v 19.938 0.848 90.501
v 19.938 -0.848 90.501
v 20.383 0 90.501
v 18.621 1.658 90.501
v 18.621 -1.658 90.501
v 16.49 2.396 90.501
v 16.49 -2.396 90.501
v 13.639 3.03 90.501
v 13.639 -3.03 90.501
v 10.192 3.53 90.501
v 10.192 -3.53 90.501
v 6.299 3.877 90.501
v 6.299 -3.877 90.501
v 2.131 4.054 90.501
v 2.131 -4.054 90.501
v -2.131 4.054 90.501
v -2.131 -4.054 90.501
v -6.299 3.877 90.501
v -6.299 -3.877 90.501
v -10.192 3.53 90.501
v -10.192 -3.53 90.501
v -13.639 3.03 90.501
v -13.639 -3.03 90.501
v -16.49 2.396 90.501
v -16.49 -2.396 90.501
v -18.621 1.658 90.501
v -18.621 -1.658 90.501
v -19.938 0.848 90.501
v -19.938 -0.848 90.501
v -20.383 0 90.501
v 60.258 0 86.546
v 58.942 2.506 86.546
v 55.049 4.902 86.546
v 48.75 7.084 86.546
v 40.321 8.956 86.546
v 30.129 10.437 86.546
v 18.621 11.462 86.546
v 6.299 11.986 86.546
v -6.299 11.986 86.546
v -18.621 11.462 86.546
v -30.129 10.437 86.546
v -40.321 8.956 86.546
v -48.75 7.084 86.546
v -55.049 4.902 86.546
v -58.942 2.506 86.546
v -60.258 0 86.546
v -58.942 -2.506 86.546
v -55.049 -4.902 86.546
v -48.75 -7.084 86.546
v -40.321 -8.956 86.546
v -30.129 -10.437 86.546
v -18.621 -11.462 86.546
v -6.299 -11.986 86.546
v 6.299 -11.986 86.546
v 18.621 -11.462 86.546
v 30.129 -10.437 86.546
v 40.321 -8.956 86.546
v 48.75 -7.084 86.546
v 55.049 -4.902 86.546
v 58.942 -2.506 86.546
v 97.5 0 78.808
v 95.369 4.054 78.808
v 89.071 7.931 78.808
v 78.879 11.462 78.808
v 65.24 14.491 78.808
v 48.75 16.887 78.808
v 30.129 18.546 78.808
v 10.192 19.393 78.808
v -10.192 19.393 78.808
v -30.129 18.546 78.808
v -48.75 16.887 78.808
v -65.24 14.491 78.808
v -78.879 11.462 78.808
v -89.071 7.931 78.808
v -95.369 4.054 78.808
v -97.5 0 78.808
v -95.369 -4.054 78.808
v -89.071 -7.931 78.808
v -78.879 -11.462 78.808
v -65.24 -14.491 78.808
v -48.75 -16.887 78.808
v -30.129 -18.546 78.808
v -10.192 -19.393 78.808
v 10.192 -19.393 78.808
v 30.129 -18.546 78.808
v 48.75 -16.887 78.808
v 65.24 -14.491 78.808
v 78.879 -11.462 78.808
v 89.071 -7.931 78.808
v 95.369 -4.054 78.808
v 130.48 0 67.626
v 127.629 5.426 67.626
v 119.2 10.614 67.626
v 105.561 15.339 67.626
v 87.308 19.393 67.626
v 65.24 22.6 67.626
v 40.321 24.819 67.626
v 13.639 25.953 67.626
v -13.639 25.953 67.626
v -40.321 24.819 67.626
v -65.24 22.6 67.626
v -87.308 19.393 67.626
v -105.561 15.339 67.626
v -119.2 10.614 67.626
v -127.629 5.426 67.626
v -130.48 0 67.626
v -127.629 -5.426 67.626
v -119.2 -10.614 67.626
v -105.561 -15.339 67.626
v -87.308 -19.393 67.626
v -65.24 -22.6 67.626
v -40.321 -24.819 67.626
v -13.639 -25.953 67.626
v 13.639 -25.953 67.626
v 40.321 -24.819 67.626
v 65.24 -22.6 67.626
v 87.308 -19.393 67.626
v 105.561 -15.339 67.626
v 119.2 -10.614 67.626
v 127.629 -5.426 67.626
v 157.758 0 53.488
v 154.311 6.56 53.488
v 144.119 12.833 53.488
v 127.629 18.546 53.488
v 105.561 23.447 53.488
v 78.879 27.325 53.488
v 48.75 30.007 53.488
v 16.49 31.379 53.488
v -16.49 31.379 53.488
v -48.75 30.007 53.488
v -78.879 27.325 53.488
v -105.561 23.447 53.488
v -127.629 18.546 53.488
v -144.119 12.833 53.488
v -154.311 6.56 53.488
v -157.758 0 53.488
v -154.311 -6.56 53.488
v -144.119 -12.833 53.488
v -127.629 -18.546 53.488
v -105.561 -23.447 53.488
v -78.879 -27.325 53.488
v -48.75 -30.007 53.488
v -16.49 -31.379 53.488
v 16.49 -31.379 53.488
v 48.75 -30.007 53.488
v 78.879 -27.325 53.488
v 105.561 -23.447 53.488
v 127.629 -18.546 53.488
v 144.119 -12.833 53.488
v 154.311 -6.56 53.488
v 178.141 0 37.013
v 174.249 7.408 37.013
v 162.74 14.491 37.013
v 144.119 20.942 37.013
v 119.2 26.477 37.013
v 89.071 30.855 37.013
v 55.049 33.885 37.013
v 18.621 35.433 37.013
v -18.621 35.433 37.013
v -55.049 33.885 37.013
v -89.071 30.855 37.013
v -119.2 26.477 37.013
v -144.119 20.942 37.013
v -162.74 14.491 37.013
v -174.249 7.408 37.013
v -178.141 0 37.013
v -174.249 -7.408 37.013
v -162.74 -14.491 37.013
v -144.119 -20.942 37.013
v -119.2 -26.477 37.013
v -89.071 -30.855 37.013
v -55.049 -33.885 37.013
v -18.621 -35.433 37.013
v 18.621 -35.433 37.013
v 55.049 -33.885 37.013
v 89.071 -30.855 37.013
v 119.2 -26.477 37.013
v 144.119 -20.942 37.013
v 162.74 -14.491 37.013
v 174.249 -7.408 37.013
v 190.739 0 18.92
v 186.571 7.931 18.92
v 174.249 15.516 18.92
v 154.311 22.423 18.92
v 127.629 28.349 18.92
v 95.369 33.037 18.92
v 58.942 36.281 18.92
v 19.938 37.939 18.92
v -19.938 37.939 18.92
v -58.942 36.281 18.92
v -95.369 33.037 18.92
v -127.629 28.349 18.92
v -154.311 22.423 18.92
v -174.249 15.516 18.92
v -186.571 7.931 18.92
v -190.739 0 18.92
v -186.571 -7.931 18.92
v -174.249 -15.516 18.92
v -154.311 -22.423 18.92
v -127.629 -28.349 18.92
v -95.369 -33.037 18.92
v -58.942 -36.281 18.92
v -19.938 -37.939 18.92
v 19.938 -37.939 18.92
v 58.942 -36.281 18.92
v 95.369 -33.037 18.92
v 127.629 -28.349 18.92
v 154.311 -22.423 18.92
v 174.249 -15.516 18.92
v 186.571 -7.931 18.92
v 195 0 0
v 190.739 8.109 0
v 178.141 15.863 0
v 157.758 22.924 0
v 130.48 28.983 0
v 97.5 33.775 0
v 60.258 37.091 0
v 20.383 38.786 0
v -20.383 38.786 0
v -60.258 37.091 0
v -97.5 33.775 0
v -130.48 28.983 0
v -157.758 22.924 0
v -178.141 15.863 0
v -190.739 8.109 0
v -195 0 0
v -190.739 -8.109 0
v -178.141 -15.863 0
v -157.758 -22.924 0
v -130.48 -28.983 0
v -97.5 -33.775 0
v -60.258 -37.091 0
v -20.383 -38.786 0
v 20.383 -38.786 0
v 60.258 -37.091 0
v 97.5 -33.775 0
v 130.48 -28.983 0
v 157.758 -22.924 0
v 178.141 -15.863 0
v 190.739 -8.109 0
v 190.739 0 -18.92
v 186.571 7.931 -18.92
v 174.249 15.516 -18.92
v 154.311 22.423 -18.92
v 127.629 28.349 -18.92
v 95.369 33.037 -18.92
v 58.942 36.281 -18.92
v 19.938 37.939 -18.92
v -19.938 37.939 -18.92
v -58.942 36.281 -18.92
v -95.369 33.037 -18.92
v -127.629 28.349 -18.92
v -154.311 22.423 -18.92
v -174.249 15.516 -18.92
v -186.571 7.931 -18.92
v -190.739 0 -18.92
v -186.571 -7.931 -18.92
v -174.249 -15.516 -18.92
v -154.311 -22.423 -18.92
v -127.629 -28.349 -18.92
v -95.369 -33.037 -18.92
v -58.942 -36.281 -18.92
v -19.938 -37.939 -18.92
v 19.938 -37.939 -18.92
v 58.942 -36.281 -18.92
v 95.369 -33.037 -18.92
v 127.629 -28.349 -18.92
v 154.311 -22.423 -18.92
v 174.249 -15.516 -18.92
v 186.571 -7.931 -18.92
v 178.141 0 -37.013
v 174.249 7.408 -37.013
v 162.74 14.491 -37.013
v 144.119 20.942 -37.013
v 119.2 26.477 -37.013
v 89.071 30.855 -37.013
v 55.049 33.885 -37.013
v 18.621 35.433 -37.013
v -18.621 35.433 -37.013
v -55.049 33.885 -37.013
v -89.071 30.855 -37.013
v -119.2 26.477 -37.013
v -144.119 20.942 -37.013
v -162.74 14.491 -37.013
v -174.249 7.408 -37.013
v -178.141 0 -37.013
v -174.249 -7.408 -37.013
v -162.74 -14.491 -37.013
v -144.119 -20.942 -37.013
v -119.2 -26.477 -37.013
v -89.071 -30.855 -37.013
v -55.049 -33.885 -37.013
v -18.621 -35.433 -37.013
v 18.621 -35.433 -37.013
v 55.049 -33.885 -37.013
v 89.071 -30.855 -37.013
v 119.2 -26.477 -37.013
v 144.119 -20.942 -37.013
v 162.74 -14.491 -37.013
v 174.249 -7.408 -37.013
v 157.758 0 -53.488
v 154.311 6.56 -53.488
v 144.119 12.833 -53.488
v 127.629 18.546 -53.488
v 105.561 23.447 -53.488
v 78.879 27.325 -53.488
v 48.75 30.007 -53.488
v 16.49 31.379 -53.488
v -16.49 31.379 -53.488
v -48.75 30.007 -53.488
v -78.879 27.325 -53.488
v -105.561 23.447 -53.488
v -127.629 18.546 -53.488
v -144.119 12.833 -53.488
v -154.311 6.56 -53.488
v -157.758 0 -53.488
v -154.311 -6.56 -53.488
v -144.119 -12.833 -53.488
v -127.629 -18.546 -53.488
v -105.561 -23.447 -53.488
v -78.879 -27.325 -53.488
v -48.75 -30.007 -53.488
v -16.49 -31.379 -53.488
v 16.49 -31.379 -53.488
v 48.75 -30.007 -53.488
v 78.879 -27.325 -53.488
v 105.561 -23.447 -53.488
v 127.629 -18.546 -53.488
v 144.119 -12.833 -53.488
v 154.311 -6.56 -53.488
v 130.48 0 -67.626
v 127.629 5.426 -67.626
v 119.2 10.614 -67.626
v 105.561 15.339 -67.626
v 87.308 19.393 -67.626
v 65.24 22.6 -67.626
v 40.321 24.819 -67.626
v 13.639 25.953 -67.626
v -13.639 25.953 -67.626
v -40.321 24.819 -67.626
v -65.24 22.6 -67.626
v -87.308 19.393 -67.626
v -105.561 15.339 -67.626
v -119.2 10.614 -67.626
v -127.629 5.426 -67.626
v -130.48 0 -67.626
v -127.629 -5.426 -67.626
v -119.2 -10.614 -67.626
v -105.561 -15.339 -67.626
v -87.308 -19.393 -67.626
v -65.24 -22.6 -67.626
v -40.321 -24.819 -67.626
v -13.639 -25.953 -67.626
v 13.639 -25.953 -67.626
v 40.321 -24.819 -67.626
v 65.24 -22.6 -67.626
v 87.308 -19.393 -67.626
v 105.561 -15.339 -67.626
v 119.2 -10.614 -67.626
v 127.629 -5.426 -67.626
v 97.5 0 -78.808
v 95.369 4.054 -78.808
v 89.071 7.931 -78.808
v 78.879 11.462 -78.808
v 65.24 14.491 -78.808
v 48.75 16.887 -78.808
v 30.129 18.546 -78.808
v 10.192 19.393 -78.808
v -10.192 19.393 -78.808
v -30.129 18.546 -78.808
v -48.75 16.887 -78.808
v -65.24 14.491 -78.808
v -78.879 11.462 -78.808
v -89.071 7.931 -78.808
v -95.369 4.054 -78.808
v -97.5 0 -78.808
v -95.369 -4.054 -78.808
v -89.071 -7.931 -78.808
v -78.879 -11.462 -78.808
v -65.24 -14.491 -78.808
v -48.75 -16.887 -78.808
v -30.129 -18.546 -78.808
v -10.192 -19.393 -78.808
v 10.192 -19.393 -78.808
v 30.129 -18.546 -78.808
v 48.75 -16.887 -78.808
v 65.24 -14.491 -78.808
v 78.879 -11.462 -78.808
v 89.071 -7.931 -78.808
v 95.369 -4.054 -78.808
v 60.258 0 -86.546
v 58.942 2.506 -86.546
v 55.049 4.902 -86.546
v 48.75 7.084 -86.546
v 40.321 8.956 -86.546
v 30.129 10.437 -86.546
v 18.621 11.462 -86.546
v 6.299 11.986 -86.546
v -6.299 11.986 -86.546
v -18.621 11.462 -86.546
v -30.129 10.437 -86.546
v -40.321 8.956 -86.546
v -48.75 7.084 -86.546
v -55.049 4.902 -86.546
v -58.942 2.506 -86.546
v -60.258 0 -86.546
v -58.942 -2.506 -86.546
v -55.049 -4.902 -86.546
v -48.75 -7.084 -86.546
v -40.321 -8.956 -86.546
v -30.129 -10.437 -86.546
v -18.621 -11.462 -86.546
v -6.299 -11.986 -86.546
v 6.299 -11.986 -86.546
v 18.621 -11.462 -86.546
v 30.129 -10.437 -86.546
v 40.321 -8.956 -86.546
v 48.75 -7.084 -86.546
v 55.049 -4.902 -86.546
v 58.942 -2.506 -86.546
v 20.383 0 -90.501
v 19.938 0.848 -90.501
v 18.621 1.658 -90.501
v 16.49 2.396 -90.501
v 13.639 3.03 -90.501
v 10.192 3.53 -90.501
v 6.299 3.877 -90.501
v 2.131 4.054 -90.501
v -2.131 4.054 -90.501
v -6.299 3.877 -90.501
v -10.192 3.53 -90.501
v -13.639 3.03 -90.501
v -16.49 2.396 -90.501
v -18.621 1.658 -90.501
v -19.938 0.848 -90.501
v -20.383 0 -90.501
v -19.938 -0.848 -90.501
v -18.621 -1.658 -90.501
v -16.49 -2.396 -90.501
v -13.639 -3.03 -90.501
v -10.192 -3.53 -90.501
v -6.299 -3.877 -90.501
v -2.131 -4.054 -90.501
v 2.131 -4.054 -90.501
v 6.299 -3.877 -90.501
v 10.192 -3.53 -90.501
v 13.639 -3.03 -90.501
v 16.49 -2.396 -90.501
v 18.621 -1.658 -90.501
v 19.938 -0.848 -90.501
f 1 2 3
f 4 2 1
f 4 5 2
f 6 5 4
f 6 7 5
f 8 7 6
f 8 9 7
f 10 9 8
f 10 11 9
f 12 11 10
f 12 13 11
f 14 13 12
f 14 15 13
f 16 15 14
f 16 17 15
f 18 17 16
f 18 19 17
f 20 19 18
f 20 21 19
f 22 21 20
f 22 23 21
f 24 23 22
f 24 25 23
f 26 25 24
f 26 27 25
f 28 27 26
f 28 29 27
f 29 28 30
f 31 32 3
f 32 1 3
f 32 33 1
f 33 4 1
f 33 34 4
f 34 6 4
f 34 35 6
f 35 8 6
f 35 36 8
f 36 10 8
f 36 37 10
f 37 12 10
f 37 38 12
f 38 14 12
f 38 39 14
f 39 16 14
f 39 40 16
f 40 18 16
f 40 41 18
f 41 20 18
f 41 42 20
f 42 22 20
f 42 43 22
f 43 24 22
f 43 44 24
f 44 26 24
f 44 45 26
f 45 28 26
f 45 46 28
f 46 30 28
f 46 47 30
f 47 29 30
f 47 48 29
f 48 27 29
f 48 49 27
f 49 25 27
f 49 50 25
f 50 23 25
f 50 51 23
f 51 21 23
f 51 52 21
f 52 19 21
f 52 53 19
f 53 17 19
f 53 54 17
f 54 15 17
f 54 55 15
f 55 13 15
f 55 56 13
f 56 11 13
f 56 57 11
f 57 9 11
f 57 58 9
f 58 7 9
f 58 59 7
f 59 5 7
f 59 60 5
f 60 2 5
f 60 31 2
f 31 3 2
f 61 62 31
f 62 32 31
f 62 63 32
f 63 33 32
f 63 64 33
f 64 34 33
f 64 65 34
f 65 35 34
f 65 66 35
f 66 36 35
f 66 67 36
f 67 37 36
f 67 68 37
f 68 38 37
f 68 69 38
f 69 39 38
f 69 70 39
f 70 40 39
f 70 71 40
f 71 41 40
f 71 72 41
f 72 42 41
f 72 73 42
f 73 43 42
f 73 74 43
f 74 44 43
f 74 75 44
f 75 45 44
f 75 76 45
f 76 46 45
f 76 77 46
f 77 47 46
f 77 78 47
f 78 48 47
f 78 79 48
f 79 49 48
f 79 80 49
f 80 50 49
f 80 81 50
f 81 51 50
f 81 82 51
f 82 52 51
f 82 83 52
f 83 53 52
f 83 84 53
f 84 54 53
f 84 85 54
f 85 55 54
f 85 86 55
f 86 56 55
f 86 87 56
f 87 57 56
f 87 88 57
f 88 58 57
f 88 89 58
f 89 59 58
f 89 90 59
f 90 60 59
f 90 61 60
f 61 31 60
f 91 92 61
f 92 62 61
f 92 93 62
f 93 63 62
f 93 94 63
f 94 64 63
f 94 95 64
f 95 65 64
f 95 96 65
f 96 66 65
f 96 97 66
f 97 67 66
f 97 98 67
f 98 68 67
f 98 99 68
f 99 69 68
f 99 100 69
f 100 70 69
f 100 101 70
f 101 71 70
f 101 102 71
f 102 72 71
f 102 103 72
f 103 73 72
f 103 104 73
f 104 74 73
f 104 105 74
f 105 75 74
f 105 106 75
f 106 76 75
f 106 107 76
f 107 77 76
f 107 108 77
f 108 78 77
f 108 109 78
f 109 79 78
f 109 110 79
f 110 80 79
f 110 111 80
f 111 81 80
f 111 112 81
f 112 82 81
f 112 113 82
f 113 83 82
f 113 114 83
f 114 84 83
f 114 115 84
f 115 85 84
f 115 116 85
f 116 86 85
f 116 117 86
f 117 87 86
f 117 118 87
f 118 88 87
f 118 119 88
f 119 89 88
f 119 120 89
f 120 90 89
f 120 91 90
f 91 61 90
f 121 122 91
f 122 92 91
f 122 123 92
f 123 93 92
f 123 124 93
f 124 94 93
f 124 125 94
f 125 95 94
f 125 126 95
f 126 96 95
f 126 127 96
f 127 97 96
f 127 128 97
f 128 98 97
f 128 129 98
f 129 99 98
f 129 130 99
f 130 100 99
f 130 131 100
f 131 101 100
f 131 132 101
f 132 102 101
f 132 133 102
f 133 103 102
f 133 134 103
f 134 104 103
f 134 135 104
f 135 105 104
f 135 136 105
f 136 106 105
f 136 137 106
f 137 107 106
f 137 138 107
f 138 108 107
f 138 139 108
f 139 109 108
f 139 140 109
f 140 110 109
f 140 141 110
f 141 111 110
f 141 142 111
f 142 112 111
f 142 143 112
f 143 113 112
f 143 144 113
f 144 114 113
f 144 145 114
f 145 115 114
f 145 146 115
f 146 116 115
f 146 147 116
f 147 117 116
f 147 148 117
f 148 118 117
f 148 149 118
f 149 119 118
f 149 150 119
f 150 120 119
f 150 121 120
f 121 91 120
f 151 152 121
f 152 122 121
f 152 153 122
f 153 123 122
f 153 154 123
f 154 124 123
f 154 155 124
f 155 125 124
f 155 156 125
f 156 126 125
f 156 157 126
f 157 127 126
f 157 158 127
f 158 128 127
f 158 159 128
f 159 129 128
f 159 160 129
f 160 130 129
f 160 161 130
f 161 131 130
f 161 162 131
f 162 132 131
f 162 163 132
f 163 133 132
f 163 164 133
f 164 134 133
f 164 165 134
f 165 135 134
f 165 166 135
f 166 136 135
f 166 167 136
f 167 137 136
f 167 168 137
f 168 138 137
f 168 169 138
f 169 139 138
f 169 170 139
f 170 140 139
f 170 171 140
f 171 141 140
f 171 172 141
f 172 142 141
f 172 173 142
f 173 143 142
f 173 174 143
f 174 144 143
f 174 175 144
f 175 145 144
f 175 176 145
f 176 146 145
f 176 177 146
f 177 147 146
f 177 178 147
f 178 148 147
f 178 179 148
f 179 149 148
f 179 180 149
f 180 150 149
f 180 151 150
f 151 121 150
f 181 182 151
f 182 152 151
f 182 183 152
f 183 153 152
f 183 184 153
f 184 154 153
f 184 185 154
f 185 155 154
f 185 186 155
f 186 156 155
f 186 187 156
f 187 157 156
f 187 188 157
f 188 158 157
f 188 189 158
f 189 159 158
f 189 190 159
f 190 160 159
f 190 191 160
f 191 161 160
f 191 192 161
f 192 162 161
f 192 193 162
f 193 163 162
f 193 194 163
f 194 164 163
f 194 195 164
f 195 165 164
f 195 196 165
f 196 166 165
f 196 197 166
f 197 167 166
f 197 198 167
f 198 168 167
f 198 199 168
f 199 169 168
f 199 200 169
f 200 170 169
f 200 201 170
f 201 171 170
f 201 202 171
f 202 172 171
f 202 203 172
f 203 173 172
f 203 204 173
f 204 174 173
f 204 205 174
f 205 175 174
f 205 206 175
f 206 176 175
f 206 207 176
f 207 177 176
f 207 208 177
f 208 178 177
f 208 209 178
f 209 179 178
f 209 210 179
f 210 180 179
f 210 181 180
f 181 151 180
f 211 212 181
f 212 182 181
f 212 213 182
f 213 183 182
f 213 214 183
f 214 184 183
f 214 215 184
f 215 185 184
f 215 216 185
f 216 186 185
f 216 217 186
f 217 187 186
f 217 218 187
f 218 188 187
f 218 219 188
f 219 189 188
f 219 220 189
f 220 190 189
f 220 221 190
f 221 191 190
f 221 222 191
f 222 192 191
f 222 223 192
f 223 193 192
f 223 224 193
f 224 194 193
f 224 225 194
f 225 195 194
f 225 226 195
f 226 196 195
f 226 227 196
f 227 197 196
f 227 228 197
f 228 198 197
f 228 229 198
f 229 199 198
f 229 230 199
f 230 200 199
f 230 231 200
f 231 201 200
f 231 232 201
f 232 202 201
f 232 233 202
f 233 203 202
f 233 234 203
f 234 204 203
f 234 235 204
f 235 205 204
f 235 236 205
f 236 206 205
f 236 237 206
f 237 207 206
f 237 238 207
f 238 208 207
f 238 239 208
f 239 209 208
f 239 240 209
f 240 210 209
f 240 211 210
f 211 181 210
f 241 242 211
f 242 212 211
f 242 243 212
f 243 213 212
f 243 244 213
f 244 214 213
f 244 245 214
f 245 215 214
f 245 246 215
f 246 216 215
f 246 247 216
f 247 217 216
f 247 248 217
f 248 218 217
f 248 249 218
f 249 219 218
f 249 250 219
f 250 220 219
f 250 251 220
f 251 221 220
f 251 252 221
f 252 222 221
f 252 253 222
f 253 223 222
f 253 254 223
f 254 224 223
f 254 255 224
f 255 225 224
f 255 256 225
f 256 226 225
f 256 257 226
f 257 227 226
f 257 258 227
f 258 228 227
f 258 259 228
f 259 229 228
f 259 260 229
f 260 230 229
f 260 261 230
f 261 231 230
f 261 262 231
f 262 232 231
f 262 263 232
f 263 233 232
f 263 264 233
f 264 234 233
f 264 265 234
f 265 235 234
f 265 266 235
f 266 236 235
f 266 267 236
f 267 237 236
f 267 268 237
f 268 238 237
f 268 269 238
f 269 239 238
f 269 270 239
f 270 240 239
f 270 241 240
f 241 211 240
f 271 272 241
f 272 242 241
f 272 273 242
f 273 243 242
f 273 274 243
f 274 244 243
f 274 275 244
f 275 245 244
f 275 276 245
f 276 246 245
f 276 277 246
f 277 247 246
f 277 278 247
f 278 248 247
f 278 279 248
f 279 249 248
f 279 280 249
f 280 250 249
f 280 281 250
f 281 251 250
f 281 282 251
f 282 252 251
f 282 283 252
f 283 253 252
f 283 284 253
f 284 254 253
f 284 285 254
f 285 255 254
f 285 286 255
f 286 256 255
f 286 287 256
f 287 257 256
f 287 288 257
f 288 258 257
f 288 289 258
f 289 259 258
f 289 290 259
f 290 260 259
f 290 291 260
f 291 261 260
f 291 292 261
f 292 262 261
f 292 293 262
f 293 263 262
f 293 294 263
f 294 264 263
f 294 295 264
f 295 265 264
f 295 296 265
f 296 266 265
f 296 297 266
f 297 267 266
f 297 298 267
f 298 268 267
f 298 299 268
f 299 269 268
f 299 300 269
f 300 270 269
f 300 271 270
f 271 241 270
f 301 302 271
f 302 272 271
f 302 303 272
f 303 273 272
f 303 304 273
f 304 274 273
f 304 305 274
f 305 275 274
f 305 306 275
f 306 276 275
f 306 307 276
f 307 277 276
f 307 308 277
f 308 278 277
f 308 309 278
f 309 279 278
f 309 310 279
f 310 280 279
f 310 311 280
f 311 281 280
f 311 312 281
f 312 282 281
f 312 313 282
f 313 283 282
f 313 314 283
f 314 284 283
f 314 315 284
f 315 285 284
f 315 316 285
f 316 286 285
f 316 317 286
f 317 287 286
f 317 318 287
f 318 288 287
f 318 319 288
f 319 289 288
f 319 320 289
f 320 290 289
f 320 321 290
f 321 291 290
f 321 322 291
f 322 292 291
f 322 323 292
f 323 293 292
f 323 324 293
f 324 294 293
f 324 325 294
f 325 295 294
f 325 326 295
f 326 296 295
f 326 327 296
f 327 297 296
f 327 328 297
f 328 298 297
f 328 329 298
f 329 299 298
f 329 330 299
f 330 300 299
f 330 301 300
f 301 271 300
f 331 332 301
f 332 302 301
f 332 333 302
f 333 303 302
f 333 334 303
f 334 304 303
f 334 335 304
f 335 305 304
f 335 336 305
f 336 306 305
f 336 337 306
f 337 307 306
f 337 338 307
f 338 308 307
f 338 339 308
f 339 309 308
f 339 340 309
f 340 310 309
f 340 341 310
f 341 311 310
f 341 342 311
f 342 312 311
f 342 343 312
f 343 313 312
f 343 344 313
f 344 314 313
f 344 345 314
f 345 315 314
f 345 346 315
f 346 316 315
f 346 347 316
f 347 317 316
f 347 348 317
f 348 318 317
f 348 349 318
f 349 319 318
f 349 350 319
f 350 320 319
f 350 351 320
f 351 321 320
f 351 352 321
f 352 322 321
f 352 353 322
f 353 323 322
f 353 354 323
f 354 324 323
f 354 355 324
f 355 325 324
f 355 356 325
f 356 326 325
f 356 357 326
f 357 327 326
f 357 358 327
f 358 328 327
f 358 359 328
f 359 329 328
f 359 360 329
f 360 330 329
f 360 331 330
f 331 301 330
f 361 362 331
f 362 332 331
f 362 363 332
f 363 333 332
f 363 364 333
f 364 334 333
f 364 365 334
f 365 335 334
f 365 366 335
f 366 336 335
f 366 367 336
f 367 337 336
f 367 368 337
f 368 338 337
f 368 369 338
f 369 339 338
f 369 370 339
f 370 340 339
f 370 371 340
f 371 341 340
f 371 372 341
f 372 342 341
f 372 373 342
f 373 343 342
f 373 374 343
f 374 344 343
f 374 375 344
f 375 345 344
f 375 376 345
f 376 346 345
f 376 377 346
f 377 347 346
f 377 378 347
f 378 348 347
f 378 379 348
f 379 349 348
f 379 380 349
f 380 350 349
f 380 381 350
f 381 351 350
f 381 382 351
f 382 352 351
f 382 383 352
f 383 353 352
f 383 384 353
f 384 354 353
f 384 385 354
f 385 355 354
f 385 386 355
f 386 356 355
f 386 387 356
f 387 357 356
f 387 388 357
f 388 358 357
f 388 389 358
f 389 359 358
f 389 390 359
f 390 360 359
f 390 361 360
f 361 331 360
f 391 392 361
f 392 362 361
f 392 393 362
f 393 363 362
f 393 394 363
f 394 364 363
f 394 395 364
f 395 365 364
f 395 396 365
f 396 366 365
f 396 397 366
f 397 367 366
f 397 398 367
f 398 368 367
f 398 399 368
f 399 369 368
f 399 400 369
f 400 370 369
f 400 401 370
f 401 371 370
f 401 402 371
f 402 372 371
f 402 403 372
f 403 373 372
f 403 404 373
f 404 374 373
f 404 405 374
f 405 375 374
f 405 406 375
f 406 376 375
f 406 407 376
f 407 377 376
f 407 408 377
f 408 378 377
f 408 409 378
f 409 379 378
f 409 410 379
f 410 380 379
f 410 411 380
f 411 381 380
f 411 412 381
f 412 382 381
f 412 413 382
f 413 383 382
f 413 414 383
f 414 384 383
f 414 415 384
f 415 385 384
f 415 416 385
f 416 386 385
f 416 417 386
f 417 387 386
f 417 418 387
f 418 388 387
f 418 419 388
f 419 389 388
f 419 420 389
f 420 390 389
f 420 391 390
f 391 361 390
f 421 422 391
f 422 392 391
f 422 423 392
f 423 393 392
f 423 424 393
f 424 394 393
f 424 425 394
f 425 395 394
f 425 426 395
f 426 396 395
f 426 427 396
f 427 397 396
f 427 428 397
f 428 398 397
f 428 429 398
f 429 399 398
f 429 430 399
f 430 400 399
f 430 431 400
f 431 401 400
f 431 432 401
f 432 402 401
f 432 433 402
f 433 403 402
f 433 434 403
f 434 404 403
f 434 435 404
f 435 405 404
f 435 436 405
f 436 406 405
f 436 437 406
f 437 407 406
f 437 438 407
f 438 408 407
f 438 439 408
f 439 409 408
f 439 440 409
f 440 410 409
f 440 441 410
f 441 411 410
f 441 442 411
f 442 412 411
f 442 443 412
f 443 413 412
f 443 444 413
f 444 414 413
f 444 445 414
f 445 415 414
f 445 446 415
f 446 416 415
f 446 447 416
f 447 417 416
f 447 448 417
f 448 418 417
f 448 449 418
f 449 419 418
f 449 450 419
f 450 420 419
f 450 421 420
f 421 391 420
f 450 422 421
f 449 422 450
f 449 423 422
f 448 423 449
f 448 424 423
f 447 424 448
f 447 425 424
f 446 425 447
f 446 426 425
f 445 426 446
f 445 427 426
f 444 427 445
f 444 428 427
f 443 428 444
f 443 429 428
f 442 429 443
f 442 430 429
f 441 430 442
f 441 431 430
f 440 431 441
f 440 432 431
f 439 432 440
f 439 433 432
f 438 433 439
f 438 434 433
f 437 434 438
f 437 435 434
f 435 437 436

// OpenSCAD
// Generated by SolidPython 1.0.1 on 2020-07-29 00:46:51


scale(v = [15, 3, 7]) {
	sphere(r = 13);
}
/***********************************************
*********      SolidPython code:      **********
************************************************
 
# import packages: SolidPython
from solid import *
from solid.utils import *
from itertools import chain, combinations, permutations


class Resize:

    def __init__(self, scad_file):
        self.scad_file = scad_file
        #self.scad_file = import_scad(scad_file)
        # cone/cylinder param:
        self.r1 = 0
        self.r2 = 0
        self.h = 0
        # rectangular prism param:
        self.w = 0
        self.l = 0
        # ellipse param:
        self.r = 0

    # import OpenScad code (file name corresponds to shape)


    # classify shape + parameters
    def assign(self, param1, param2, param3):
        if self.scad_file == 'cone.scad':
            self.r1 = param1
            self.r2 = param2
            self.h = param3
        elif self.scad_file == 'cylinder.scad':
            self.r1 = param1
            self.r2 = param2
            self.h = param3
        elif self.scad_file == 'rectangularPrism.scad':
            self.h = param1
            self.l = param2
            self.w = param3
        else:
            self.r = param1
            self.h = param2

    # resize parameters
    def iterate(self):
        x = range(3, 20, 2)
        i = 1
        if self.scad_file == 'cone.scad':
            tempList = list(permutations(x, 2))
            for temp in tempList:
                param1 = temp[0]
                param2 = temp[1]
                filepath = 'produced_scad_files/' + 'cone' + str(param1) + '_' + str(param2) + '_' + '.scad'
                scad_render_to_file(cylinder(h=param1, r1=param2, r2=0), filepath)

        elif self.scad_file == 'cylinder.scad':
            tempList = list(permutations(x, 3))
            for temp in tempList:
                param1 = temp[0]
                param2 = temp[1]
                filepath = 'produced_scad_files/' + 'cylinder' + str(param1) + '_' + str(param2) + '_' + '.scad'
                scad_render_to_file(cylinder(h=param1, r1=param2, r2=param2), filepath)

        elif self.scad_file == 'rectangularPrism.scad':
            tempList = list(permutations(x, 3))
            for temp in tempList:
                param1 = temp[0]
                param2 = temp[1]
                param3 = temp[2]
                filepath = 'produced_scad_files/' + 'rectangularPrism' + str(param1) + '_' + str(param2) + '_' + str(
                    param3) + '.scad'
                scad_render_to_file(cube(size=(param1, param2, param3)), filepath)

        elif self.scad_file == 'ellipse.scad':
            tempList = list(permutations(x, 4))
            for temp in tempList:
                param1 = temp[0]
                param2 = temp[1]
                param3 = temp[2]
                param4 = temp[3]
                filepath = 'produced_scad_files/' + 'ellipse' + str(param1) + '_' + str(param2) + '_' + str(param3) + '_' + str(param4) + '.scad'
                scad_render_to_file(scale([param1, param2, param3])(sphere(r=param4)), filepath)

    def render_to_scadfile(self):
        scad_render_to_file(scad, 'example.scad') 
 
************************************************/
